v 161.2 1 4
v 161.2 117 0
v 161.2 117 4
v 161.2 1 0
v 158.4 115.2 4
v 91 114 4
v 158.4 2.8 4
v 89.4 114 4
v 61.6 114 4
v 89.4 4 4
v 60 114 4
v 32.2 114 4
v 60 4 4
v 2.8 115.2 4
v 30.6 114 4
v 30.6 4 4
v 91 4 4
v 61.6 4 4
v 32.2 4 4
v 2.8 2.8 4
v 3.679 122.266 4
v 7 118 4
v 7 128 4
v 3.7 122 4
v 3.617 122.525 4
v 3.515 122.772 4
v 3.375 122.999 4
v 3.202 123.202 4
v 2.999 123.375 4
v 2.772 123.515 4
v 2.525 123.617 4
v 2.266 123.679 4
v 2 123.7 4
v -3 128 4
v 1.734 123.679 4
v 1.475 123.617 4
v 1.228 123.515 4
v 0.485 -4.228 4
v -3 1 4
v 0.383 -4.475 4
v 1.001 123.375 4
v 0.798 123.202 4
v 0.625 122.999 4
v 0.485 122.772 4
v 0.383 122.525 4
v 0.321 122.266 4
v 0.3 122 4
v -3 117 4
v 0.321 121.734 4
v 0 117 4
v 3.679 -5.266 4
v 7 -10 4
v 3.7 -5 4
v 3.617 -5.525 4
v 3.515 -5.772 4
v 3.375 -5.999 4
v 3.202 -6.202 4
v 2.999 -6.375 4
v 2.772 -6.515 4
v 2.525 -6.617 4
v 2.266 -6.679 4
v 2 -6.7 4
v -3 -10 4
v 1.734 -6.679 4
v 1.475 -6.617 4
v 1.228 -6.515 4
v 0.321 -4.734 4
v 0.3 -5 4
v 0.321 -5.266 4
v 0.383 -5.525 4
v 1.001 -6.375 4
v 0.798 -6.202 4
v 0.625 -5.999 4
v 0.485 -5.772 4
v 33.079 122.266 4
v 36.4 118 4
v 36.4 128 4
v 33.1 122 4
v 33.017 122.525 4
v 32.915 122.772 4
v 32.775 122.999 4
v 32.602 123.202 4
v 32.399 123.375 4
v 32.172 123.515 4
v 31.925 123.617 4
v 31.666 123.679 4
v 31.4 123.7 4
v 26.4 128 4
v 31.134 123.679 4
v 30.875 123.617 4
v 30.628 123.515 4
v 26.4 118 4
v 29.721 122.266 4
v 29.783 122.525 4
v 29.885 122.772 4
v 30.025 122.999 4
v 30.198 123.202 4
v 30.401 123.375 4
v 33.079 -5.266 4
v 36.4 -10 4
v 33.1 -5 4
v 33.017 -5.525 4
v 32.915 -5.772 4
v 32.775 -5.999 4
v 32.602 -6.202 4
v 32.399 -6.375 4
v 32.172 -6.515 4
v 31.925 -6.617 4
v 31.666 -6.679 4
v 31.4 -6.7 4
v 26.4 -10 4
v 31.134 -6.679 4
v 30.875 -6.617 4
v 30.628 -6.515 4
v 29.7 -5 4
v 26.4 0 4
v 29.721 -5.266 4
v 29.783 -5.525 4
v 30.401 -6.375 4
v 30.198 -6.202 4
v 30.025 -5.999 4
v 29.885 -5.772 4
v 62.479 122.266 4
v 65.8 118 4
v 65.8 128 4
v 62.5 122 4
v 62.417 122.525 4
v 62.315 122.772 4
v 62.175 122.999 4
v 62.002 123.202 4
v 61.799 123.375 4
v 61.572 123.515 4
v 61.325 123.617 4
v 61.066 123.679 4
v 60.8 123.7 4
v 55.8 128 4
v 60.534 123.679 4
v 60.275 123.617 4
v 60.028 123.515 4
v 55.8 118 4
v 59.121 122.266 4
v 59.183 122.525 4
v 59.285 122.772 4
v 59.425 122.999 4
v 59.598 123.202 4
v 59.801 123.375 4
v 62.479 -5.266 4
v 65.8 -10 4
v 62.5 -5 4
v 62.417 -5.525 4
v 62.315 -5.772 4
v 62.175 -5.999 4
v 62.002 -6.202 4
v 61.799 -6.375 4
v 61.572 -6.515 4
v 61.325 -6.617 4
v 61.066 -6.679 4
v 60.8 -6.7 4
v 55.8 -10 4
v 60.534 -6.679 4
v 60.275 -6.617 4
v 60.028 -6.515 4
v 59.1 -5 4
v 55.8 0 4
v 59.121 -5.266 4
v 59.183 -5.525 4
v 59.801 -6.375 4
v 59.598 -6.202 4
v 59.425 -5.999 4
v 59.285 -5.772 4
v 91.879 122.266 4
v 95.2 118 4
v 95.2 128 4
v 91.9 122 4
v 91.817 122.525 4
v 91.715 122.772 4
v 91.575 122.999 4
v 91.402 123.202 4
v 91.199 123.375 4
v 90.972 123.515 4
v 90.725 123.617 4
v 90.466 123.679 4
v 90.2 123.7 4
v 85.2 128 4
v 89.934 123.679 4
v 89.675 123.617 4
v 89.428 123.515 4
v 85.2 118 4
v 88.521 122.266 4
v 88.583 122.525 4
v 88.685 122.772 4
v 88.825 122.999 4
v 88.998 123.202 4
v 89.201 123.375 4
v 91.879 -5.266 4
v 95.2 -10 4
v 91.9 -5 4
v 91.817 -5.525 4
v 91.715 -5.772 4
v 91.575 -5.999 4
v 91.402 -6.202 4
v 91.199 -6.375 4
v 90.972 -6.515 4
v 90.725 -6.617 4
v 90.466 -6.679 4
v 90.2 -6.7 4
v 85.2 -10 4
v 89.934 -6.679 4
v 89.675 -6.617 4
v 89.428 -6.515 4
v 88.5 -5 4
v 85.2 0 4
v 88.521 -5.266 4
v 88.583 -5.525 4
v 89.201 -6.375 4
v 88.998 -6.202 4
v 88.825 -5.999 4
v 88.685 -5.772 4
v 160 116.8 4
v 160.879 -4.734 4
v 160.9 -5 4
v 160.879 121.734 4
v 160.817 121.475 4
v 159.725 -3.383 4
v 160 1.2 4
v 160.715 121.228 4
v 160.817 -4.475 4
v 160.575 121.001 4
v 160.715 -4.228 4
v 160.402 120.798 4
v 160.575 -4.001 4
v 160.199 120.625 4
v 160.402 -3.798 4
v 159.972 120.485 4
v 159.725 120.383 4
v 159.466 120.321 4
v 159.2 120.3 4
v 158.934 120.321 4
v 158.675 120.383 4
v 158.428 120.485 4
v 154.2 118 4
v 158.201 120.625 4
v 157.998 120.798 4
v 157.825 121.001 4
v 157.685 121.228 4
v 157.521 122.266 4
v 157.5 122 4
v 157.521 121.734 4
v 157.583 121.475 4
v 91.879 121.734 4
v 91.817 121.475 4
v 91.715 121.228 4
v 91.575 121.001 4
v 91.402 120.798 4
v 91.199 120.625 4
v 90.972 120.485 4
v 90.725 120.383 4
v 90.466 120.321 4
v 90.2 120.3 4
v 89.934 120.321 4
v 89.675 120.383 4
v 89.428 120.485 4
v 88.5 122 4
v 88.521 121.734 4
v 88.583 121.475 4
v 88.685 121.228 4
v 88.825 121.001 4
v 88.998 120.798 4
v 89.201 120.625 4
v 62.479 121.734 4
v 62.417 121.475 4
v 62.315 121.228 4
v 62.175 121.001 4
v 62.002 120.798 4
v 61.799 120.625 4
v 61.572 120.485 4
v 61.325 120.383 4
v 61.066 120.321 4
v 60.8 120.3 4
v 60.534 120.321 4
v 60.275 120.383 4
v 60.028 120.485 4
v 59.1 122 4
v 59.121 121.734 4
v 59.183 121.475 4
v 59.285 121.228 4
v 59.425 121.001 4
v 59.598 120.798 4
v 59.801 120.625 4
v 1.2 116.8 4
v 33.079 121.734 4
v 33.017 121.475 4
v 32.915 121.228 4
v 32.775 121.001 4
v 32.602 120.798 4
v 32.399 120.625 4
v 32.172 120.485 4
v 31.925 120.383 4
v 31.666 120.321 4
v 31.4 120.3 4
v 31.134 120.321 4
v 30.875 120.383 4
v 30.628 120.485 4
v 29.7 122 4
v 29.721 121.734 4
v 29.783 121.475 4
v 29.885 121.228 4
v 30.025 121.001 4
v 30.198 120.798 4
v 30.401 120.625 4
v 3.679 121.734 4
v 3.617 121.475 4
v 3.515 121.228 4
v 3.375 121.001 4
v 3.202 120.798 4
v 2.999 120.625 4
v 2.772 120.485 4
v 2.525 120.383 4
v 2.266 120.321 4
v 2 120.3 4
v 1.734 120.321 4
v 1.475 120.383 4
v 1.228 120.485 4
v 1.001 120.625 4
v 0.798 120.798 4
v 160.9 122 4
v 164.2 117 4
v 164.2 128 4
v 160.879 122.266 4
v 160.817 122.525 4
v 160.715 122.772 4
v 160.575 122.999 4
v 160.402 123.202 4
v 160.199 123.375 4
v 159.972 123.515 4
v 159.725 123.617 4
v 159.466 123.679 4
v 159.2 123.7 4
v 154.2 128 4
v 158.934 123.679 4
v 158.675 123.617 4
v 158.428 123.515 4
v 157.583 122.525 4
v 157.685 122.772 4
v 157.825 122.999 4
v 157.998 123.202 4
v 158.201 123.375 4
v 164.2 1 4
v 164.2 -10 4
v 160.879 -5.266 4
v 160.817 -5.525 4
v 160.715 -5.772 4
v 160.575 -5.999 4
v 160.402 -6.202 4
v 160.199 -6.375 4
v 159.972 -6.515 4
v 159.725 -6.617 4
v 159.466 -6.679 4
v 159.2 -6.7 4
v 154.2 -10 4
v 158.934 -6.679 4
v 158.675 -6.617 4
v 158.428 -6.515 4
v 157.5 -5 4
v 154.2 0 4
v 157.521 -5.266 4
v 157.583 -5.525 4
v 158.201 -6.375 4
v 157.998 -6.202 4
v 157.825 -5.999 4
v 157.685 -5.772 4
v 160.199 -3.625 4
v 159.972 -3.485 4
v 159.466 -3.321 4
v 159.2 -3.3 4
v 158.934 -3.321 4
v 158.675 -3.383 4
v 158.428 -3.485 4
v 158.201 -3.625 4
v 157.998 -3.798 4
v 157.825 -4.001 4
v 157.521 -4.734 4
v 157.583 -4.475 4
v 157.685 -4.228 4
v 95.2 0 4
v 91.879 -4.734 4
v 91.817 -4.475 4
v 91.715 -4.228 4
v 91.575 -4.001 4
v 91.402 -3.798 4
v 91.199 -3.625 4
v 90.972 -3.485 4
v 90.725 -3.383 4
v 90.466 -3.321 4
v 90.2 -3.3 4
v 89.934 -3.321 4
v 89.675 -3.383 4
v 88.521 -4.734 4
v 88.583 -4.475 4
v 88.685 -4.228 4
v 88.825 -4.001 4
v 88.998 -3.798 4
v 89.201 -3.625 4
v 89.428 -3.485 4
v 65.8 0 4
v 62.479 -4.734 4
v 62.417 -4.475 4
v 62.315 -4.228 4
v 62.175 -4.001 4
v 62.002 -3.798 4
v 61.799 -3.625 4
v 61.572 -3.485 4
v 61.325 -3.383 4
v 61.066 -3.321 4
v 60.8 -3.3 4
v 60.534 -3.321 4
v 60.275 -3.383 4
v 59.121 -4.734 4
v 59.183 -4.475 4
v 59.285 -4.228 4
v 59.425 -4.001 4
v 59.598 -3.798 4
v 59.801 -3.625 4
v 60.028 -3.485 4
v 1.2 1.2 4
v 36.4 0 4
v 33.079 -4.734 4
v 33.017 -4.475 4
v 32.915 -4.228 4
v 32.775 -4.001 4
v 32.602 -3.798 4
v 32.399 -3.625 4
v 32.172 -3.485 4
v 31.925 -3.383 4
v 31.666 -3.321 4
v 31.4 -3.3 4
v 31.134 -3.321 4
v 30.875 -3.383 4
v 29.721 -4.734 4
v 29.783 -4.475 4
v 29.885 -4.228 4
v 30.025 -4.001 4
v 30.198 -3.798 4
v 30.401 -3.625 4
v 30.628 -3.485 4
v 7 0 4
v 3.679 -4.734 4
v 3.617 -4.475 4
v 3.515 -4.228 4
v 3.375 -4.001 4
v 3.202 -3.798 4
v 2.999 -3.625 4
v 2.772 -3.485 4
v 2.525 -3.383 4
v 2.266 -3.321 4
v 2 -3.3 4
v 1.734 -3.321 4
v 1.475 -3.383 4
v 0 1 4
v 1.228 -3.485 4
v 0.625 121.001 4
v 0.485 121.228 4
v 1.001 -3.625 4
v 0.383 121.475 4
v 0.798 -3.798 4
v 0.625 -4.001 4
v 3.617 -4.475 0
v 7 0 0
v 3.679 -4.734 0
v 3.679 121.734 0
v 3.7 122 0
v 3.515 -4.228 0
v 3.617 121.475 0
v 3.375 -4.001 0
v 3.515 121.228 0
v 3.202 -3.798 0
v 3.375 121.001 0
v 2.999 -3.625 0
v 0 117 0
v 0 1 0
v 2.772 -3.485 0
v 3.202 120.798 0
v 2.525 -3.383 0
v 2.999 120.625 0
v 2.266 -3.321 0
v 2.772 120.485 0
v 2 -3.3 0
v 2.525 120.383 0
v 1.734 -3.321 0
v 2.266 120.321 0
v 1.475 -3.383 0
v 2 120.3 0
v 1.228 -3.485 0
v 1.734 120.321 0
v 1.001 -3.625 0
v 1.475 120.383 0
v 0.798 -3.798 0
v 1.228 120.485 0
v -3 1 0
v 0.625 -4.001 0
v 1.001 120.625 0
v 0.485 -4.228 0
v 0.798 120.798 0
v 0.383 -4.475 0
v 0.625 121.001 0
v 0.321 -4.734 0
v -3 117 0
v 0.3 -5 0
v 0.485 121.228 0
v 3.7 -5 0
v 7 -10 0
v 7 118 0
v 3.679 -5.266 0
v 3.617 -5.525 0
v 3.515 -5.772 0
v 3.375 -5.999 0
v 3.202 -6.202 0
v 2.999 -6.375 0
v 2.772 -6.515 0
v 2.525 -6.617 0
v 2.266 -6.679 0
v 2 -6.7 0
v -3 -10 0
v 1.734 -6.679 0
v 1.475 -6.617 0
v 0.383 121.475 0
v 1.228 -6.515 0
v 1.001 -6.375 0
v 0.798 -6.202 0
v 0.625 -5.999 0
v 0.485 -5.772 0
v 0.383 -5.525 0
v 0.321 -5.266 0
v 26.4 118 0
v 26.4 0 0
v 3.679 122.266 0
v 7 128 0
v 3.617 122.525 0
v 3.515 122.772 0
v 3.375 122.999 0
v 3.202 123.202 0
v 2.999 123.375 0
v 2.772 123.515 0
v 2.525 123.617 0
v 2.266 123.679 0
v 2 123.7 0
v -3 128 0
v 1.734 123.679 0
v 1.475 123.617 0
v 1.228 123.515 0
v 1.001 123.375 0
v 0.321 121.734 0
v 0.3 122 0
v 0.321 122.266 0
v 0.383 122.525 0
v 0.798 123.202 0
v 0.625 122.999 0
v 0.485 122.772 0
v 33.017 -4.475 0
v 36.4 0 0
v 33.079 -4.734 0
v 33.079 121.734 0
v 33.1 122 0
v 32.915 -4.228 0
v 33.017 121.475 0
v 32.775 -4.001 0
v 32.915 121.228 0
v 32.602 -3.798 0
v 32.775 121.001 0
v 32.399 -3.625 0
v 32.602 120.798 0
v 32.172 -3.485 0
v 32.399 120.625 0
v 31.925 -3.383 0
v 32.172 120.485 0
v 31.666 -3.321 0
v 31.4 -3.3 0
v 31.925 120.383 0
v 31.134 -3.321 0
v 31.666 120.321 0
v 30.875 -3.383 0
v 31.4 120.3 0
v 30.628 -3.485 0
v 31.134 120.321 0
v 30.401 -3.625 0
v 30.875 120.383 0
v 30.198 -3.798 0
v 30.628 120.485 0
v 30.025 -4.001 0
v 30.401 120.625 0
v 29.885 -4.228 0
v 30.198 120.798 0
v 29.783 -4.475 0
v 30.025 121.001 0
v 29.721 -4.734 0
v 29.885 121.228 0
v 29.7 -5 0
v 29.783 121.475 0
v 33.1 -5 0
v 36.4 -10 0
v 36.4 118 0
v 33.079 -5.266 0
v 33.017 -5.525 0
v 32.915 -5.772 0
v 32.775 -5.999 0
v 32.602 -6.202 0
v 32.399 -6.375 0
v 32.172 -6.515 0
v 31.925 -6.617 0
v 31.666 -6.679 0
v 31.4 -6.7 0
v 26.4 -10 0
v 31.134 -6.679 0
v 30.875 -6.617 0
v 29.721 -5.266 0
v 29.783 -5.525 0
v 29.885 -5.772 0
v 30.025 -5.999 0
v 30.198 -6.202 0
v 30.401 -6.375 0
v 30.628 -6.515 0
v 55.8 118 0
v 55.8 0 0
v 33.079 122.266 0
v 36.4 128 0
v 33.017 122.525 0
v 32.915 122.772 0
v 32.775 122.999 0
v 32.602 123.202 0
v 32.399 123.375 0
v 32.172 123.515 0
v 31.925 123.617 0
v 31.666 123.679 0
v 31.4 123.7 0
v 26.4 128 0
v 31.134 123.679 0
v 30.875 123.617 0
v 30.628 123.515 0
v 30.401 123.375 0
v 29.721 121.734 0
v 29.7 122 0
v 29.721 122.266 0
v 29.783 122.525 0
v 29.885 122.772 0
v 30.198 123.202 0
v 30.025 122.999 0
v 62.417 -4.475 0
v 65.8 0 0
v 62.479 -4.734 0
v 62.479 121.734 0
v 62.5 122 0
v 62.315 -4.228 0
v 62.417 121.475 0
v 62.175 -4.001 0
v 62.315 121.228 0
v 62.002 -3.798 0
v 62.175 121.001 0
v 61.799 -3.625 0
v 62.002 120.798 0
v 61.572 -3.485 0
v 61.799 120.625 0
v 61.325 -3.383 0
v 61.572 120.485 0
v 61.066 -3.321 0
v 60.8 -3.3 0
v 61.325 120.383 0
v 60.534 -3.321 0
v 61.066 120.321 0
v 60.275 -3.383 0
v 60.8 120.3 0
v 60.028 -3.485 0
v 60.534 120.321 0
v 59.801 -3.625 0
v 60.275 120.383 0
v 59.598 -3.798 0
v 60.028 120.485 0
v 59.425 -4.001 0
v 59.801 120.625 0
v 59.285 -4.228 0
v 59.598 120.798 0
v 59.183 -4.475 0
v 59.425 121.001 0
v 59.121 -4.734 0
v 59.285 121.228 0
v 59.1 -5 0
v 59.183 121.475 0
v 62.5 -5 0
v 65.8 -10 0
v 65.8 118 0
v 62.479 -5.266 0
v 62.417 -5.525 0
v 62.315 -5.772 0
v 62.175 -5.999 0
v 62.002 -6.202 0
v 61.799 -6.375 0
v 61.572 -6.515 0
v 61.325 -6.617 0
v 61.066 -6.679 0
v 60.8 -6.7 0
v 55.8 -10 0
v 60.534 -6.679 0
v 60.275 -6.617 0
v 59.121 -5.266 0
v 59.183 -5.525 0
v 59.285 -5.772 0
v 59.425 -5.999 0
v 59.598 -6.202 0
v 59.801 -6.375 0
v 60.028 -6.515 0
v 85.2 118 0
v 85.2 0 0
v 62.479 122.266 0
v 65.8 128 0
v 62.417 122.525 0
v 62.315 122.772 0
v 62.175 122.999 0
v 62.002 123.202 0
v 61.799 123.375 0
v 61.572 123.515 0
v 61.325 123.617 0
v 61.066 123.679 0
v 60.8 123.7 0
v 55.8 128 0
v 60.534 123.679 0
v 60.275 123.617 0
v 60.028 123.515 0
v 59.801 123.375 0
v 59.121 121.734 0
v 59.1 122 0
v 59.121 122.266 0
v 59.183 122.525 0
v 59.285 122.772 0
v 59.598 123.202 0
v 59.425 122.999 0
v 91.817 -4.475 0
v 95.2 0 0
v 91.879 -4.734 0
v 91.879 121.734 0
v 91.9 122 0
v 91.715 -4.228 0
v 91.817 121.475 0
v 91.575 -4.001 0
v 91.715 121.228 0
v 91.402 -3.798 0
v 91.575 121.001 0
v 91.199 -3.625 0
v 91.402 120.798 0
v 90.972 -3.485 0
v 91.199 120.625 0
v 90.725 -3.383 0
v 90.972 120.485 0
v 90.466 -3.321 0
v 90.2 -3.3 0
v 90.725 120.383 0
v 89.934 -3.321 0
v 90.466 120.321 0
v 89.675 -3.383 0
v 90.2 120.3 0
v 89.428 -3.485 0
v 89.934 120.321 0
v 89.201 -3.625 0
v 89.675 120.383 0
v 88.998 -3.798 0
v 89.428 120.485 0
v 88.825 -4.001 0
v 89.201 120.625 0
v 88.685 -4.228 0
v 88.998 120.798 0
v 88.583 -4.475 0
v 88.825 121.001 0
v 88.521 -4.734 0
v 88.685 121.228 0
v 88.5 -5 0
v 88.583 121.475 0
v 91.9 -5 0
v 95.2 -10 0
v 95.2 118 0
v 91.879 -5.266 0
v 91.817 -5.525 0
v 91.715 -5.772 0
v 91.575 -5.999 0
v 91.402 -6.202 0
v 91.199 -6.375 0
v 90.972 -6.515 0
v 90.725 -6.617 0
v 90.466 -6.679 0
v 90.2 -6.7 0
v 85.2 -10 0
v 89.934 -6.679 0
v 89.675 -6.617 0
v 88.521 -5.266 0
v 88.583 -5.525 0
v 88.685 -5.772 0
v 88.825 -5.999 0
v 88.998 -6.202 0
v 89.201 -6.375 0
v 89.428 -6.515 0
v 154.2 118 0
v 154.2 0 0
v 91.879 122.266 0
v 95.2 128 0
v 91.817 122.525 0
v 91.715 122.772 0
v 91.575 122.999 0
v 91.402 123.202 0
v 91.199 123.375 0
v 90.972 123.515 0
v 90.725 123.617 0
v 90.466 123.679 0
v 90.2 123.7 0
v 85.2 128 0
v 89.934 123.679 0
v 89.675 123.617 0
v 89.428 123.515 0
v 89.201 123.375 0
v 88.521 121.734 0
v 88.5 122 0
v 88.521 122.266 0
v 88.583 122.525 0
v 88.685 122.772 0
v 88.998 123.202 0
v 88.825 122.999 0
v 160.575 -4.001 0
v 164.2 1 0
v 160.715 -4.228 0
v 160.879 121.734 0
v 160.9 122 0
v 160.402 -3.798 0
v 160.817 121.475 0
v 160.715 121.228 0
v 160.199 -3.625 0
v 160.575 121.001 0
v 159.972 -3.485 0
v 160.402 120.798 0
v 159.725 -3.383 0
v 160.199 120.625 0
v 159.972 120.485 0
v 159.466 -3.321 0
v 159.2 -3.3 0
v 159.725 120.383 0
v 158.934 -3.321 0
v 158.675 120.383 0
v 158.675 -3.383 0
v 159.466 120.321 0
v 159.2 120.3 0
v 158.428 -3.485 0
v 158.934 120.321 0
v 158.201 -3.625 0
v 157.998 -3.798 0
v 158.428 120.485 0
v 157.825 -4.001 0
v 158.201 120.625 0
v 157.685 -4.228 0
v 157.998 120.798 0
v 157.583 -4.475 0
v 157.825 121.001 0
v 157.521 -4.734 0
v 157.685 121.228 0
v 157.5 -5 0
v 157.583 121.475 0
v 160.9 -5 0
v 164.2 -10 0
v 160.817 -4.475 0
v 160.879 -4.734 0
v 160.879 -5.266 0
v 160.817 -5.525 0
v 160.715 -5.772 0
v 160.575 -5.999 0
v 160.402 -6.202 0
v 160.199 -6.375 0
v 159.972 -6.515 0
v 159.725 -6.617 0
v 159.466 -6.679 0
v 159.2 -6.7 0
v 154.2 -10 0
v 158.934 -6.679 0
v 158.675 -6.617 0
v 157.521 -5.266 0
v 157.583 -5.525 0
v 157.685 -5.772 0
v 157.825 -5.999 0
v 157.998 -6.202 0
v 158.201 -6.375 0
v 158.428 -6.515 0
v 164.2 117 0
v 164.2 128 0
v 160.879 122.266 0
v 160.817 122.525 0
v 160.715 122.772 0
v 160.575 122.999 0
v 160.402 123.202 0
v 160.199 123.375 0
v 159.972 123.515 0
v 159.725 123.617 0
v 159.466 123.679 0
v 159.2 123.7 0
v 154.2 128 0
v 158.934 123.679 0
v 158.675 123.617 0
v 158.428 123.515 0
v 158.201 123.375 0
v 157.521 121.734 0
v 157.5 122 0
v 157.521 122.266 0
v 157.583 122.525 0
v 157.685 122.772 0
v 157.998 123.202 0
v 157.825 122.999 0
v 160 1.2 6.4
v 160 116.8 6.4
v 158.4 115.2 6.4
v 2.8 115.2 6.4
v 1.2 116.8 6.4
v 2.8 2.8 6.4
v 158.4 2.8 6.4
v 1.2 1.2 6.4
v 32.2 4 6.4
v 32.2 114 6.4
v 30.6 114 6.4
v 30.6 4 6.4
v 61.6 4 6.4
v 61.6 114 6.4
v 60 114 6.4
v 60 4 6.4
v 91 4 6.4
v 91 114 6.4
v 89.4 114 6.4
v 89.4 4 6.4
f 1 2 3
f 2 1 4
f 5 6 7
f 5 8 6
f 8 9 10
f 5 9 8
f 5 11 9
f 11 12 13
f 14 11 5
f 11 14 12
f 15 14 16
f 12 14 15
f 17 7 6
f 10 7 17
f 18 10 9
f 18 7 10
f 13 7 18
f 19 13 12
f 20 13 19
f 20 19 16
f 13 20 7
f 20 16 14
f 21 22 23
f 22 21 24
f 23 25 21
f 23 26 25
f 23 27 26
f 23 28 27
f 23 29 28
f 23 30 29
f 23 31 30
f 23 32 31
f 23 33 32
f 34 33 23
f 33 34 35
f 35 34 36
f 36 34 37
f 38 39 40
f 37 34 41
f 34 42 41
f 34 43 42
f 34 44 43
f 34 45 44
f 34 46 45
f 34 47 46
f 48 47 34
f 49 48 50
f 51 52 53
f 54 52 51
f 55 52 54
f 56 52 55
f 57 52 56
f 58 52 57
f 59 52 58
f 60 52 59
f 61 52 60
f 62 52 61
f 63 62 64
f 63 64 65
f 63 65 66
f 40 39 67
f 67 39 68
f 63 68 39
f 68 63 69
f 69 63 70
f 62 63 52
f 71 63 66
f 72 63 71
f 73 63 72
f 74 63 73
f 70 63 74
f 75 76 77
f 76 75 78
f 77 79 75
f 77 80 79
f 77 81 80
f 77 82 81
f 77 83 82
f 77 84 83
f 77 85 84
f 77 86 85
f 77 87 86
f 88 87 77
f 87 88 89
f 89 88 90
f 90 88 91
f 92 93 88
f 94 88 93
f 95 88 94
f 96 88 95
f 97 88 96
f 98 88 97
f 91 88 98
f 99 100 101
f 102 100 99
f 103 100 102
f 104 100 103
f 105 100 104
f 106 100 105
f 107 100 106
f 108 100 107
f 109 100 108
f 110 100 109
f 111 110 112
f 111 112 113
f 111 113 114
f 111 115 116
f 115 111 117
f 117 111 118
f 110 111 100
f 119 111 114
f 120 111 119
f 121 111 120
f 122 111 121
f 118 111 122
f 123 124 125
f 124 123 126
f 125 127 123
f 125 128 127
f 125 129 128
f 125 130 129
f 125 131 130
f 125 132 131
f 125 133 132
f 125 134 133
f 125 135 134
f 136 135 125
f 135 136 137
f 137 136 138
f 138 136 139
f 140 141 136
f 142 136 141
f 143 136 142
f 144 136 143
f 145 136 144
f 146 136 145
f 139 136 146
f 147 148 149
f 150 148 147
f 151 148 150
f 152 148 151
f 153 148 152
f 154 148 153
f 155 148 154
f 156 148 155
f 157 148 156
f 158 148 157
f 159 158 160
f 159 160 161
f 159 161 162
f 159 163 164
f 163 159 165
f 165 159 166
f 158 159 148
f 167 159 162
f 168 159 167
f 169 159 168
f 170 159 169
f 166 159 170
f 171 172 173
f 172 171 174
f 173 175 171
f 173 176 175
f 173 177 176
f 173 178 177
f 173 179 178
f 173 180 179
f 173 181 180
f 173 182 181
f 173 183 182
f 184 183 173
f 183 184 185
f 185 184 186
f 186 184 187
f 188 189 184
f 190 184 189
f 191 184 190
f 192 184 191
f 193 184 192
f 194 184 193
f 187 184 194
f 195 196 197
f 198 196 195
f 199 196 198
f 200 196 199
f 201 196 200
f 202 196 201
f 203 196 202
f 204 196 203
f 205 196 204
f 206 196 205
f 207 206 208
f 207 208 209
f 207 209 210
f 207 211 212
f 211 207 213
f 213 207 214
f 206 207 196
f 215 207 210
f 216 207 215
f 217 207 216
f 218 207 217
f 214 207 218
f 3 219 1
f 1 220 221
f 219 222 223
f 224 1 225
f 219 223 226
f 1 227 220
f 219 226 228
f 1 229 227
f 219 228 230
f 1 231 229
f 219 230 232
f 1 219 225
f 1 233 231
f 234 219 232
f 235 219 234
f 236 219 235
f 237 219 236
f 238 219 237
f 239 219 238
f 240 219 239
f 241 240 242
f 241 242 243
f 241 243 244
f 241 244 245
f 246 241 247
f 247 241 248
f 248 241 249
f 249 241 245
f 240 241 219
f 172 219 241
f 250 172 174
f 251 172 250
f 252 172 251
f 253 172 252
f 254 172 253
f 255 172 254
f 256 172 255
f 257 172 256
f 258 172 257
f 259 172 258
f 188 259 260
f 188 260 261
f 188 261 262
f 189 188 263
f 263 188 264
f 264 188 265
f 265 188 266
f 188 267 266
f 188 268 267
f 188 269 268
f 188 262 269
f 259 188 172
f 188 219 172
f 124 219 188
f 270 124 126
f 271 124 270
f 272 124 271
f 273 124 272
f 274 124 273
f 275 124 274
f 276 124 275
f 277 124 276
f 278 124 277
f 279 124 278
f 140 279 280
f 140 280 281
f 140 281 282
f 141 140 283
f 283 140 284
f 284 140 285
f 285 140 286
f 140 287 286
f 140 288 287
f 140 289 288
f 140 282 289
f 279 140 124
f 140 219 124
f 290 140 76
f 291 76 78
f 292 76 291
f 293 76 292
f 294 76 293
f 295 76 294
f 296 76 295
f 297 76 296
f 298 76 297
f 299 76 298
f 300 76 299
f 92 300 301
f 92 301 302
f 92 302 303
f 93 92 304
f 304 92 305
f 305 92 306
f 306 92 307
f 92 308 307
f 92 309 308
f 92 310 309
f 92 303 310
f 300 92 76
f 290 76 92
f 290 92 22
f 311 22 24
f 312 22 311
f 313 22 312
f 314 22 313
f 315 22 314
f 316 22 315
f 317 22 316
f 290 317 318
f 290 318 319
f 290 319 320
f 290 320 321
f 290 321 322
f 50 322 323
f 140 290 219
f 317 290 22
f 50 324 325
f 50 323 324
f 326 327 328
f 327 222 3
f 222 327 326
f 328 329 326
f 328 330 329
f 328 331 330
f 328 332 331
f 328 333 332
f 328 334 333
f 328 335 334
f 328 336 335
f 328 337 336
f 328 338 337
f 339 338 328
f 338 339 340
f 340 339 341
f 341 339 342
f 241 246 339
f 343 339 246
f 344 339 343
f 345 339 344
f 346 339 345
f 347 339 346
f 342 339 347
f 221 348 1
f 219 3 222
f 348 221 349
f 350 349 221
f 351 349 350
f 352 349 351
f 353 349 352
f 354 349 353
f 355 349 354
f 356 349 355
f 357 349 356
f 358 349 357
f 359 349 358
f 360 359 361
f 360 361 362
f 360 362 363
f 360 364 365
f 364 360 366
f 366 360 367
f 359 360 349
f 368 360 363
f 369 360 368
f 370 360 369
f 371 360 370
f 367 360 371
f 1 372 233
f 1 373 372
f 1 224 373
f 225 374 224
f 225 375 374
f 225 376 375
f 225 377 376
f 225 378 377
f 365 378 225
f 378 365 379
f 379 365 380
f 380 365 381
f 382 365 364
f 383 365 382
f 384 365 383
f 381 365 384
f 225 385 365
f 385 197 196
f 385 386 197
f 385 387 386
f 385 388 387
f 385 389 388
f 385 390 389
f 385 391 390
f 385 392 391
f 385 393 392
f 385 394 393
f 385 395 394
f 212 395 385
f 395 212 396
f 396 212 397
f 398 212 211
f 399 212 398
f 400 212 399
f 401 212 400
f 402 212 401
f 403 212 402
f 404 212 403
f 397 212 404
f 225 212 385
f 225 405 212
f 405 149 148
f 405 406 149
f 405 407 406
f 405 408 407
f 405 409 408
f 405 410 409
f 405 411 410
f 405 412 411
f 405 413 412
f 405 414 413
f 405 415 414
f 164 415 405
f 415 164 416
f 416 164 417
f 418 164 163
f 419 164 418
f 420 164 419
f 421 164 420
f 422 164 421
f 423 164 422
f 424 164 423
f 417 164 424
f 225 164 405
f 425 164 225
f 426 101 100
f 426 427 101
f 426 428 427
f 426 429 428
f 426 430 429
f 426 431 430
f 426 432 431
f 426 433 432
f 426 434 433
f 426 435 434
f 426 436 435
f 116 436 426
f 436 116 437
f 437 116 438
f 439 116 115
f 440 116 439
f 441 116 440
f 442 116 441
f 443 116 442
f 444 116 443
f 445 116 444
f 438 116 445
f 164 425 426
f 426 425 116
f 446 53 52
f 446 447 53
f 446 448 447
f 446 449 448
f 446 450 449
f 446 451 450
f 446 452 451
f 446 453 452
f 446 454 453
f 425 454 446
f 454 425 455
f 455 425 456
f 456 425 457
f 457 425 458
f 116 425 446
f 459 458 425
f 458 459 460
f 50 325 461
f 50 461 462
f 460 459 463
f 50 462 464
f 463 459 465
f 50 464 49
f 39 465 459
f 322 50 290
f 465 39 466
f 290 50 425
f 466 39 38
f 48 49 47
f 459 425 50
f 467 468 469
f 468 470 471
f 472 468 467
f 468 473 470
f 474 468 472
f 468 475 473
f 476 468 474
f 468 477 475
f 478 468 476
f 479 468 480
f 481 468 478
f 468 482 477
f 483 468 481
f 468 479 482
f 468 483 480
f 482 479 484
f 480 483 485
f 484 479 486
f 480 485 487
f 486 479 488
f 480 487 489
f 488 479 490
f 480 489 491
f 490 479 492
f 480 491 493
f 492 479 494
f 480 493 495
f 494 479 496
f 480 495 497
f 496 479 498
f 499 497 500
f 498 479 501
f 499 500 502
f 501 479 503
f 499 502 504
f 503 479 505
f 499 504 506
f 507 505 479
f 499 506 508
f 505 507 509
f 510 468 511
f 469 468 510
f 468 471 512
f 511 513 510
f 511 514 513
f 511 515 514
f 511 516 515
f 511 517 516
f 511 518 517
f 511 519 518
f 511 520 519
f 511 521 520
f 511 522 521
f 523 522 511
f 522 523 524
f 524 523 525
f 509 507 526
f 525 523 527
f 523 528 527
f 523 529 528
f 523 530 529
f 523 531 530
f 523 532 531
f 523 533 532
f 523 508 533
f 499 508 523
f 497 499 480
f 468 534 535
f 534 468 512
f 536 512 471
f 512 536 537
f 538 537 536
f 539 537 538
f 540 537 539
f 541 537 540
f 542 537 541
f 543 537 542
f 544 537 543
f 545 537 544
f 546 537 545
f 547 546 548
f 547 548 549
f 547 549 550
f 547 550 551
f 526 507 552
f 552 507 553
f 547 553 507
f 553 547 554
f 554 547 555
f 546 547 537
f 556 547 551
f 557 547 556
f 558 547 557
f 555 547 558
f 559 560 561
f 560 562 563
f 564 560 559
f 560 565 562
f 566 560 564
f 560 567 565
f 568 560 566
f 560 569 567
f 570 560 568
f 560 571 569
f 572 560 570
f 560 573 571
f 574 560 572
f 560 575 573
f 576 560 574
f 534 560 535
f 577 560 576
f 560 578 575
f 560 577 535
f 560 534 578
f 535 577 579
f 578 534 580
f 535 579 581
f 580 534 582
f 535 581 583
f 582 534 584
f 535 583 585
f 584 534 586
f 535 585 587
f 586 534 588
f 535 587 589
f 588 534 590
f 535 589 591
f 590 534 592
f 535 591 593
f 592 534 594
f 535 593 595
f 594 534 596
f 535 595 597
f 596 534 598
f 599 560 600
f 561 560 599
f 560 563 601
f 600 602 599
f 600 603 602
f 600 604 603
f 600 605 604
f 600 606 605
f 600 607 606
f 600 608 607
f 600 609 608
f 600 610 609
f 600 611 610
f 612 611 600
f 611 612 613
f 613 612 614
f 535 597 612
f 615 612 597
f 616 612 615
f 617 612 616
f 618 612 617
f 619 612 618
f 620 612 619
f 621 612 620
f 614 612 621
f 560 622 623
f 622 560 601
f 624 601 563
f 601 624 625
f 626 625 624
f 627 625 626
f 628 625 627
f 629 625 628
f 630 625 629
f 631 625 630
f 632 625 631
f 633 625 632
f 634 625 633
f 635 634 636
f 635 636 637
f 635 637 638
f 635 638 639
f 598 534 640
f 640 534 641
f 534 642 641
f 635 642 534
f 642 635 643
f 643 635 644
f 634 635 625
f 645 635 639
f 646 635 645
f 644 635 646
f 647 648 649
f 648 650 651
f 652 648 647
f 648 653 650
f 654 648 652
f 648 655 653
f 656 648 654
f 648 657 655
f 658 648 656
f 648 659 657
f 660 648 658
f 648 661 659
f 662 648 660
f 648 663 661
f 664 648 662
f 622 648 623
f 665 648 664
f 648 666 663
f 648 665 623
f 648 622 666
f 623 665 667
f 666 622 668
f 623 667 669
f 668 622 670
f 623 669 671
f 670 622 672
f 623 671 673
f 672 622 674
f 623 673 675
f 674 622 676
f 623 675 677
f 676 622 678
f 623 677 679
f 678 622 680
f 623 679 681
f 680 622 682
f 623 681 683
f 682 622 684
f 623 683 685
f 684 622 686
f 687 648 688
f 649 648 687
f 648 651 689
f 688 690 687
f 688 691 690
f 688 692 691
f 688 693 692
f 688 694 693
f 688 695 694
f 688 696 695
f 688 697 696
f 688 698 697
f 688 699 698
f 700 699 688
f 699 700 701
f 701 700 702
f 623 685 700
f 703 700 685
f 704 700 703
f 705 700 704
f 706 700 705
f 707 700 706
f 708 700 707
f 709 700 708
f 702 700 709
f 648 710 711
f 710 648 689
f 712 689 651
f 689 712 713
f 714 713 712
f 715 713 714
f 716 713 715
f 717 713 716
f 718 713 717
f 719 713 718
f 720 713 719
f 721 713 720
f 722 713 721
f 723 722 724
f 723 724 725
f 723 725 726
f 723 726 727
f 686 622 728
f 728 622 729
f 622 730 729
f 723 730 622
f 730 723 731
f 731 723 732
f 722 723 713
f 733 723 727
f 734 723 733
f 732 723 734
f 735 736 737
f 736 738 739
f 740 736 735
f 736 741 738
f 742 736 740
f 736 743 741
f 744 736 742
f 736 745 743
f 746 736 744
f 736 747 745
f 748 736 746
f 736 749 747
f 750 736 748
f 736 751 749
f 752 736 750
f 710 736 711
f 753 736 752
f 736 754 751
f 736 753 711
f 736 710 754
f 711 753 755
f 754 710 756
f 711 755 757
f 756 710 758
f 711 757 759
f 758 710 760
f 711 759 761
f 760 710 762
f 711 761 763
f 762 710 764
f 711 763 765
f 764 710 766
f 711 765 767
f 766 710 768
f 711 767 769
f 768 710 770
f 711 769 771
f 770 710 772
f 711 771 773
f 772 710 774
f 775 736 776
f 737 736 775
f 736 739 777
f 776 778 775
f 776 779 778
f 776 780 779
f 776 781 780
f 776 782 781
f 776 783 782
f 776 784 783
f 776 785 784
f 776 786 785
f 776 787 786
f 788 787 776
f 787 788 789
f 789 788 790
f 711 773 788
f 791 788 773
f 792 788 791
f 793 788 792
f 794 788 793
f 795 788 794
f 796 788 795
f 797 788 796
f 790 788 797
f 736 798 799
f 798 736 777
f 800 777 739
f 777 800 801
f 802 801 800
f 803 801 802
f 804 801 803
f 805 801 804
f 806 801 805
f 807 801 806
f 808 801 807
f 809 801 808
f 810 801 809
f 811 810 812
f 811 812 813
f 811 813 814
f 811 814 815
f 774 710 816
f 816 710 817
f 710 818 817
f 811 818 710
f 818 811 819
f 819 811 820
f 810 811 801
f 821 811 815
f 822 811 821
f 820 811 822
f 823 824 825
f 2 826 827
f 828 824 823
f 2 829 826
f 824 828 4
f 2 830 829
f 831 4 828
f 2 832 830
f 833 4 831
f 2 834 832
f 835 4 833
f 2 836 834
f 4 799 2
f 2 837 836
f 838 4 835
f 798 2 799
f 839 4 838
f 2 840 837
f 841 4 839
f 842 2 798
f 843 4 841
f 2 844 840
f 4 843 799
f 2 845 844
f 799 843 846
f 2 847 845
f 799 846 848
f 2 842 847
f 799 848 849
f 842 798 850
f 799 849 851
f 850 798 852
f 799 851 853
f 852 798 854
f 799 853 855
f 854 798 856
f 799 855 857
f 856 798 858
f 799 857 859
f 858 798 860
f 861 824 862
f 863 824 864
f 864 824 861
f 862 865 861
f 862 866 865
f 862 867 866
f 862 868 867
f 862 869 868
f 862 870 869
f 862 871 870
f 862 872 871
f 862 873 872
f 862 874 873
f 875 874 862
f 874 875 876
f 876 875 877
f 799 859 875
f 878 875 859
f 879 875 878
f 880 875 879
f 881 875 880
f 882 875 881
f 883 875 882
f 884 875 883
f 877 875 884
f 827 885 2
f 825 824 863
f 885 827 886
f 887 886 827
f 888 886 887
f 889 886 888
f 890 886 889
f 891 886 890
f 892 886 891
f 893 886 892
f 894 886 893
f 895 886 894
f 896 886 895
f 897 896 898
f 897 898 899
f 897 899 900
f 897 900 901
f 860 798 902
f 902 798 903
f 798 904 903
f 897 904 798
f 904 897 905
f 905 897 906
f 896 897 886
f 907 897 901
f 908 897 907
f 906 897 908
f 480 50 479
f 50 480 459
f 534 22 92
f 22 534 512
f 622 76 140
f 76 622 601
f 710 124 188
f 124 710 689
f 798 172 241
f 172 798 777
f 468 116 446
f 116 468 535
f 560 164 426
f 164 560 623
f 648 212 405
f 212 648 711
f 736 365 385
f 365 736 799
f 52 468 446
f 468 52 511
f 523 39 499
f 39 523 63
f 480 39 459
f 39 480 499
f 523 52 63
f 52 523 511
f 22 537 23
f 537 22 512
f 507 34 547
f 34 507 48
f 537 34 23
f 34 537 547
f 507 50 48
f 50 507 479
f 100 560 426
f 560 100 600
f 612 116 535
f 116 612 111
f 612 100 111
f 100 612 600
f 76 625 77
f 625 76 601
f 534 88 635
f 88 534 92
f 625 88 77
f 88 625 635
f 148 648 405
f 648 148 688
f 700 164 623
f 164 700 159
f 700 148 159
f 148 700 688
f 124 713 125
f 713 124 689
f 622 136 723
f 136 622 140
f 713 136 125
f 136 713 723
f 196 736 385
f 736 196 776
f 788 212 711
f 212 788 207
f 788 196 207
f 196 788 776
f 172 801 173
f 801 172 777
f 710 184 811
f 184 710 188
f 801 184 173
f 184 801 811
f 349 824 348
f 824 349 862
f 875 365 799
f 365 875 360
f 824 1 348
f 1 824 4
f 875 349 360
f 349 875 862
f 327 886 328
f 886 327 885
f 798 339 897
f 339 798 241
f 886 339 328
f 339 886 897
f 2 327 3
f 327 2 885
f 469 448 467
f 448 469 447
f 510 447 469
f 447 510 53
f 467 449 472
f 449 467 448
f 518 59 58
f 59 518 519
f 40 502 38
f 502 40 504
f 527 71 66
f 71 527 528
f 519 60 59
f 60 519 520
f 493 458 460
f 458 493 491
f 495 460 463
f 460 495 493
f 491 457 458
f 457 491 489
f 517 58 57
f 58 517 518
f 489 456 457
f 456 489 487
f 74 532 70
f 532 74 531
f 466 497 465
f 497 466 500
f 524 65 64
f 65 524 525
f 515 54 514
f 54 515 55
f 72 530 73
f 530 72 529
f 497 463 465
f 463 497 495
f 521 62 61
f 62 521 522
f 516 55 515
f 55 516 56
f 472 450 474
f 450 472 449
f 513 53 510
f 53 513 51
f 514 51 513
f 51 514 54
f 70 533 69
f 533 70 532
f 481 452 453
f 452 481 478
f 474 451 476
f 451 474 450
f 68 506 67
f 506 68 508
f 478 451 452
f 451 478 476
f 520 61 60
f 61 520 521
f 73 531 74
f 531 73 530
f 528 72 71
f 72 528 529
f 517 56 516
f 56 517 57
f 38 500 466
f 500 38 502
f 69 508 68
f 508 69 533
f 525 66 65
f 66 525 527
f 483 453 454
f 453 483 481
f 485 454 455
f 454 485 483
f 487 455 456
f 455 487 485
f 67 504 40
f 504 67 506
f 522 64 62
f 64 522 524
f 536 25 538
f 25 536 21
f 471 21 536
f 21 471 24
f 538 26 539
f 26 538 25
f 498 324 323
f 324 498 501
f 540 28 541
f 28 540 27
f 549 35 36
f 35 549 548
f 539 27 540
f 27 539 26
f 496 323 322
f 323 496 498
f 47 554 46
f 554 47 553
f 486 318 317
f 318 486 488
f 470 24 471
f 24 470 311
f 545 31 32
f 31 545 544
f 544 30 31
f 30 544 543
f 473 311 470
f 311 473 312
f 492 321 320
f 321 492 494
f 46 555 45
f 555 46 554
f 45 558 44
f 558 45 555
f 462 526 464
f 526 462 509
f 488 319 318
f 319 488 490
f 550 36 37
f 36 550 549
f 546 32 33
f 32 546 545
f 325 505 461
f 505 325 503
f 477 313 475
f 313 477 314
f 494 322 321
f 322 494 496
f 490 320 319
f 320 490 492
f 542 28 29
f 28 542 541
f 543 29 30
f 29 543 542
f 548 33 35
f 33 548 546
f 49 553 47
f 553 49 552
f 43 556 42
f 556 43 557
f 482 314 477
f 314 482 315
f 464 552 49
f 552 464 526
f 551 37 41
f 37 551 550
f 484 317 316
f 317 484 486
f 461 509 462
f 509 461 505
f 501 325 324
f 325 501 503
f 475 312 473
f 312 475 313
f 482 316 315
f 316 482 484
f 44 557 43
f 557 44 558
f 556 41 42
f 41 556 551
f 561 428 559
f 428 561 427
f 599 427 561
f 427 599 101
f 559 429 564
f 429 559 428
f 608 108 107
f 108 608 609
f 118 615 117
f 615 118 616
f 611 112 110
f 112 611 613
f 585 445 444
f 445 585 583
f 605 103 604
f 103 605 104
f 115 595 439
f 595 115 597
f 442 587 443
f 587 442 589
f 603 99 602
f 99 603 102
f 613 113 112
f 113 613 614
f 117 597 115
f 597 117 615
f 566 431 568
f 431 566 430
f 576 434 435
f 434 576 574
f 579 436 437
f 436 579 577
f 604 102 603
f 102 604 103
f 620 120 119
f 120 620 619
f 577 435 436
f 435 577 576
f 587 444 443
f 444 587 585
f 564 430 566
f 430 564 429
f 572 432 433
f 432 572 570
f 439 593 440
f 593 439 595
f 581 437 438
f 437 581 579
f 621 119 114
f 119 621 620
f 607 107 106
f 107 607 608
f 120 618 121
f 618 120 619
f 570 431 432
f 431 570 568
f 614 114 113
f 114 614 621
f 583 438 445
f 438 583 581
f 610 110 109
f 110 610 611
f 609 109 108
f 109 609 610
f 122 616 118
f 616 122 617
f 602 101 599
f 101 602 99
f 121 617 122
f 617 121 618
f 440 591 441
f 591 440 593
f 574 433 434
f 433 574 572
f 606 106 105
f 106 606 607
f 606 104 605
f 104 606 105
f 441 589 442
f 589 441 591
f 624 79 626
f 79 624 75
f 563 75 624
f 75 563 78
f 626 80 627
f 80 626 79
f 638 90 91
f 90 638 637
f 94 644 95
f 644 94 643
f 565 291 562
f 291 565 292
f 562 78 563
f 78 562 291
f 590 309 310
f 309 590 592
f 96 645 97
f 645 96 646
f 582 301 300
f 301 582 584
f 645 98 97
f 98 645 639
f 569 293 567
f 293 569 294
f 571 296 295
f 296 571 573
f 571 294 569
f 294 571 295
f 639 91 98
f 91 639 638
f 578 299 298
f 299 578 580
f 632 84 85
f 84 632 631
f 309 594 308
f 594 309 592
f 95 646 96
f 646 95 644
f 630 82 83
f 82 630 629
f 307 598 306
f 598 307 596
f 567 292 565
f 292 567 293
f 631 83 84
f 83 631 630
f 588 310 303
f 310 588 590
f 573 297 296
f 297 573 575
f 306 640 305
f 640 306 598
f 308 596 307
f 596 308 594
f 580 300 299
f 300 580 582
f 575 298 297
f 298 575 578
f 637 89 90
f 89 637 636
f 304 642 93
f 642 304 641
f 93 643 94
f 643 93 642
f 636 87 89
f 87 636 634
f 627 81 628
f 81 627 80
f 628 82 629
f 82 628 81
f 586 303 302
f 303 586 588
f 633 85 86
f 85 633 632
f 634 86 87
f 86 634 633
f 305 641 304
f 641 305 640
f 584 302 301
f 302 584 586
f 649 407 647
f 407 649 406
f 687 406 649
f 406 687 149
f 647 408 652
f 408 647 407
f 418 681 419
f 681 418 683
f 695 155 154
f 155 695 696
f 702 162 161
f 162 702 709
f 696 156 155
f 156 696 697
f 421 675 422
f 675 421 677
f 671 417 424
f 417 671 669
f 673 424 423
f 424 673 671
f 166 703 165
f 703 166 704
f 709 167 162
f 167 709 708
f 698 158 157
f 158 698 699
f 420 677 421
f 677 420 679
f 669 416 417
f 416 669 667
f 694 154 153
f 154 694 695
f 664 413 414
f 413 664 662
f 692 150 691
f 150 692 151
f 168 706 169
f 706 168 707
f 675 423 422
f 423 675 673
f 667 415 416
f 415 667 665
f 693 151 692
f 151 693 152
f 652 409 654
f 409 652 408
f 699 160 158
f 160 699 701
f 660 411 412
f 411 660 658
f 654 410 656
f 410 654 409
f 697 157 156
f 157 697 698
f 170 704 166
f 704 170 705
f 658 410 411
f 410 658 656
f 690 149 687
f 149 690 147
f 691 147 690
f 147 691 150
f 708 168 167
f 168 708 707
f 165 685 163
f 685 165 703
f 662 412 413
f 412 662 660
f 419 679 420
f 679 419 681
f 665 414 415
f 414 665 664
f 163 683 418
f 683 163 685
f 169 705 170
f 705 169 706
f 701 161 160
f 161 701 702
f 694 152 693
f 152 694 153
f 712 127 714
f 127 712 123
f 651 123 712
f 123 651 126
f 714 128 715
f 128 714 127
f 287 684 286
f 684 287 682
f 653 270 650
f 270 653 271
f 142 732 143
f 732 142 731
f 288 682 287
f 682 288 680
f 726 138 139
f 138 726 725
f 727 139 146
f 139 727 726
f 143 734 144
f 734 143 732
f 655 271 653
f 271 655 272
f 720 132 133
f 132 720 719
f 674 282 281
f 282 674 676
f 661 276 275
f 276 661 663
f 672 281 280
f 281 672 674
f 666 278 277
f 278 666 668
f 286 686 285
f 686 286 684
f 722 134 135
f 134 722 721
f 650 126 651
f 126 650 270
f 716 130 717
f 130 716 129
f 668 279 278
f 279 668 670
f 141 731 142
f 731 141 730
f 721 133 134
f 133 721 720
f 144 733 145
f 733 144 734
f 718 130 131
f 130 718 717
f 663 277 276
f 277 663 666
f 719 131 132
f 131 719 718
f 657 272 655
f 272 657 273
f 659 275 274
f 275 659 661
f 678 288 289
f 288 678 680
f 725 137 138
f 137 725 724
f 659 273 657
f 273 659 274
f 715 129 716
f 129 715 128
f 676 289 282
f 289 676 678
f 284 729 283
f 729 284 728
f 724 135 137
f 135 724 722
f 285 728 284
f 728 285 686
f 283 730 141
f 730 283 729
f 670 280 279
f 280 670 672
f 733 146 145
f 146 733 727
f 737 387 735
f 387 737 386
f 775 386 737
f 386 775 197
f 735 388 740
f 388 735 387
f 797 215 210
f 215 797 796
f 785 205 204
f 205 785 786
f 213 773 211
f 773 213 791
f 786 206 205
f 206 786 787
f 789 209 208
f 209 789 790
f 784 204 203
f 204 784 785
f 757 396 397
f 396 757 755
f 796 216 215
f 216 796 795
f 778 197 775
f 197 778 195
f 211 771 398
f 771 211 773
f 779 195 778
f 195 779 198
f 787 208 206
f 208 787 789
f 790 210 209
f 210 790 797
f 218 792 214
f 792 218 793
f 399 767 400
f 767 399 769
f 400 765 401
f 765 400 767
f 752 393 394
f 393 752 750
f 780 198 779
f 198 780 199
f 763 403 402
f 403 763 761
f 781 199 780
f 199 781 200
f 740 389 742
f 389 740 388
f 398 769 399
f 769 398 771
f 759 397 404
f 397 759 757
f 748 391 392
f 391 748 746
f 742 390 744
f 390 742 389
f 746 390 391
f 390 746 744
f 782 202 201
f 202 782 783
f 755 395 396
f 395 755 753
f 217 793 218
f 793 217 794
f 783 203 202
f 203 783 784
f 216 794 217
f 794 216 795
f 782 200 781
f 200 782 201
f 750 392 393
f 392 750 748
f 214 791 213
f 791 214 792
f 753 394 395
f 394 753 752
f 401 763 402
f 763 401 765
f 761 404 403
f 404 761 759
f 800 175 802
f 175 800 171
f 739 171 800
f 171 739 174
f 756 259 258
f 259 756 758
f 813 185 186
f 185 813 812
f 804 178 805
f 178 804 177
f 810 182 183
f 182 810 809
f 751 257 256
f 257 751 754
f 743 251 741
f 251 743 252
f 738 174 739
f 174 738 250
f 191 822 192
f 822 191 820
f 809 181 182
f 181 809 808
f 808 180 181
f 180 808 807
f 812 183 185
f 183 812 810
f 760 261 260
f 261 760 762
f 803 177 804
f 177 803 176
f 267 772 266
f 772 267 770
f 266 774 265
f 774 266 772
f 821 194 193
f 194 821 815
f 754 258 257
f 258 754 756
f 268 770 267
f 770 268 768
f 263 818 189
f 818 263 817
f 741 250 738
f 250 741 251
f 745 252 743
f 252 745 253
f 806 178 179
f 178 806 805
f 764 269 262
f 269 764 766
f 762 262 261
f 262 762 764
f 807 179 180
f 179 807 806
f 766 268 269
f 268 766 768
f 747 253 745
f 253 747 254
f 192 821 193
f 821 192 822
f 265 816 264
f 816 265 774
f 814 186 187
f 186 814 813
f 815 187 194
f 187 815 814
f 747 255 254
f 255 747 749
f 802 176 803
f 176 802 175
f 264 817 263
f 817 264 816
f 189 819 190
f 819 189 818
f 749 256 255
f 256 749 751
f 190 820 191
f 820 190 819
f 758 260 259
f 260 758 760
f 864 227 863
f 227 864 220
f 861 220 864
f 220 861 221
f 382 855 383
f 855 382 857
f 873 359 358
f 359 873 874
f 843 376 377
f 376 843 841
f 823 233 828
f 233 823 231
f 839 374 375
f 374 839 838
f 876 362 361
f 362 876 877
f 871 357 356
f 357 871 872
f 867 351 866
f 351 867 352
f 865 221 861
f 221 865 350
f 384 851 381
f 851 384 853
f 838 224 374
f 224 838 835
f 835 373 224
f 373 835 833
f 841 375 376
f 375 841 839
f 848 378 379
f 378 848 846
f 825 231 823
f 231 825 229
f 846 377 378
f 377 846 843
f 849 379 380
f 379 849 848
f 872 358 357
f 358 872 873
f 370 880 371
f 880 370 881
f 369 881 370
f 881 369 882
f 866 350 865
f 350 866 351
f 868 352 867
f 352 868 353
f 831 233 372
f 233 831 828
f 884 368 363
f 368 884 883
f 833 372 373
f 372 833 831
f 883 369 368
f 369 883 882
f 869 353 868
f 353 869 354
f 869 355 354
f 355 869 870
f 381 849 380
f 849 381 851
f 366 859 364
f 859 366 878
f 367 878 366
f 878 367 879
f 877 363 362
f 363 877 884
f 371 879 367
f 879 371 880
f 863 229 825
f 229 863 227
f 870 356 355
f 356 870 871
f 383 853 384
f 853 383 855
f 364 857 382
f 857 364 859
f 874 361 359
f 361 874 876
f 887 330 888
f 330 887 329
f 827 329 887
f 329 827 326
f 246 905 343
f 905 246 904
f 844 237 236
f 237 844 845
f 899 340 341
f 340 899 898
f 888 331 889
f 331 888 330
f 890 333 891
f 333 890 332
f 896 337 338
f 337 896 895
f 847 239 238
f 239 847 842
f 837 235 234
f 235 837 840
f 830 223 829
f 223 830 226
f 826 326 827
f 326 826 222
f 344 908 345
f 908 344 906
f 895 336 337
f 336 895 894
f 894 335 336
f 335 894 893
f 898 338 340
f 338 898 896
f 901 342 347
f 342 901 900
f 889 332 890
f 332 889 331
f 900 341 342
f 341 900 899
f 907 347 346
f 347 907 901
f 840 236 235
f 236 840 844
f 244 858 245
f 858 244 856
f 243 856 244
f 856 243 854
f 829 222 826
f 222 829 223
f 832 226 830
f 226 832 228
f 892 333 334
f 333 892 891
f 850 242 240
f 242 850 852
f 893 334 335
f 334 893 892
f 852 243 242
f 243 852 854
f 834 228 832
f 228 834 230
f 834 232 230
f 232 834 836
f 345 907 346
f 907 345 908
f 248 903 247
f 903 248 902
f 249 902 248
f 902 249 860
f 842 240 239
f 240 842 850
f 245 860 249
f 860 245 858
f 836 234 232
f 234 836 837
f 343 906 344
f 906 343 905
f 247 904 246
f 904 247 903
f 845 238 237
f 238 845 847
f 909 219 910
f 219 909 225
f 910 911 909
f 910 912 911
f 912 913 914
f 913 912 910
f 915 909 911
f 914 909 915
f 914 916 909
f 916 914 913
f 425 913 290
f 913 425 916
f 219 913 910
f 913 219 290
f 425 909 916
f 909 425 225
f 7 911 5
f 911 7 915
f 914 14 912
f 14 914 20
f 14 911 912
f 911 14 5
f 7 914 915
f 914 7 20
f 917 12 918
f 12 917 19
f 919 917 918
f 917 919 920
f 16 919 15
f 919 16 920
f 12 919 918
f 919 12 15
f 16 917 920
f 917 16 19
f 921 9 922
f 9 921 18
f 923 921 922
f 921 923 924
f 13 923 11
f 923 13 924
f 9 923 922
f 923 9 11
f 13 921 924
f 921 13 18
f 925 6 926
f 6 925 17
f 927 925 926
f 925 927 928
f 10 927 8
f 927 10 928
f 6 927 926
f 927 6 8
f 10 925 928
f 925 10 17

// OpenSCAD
// Auto-generated Marine Vault LID V2 - External Fastener Tabs
$fn = 40;

module screw_tabs_lid() {
    // Main flat lid plate
    cube([161.2, 118.0, 4.0]);
    
    // Matching ears for the lid clearance bolts
        translate([-3.0, -10.0, 0]) cube([10.0, 10.0 + 1, 4.0]);
    translate([-3.0, 118.0 - 1, 0]) cube([10.0, 10.0 + 1, 4.0]);
    translate([26.4, -10.0, 0]) cube([10.0, 10.0 + 1, 4.0]);
    translate([26.4, 118.0 - 1, 0]) cube([10.0, 10.0 + 1, 4.0]);
    translate([55.8, -10.0, 0]) cube([10.0, 10.0 + 1, 4.0]);
    translate([55.8, 118.0 - 1, 0]) cube([10.0, 10.0 + 1, 4.0]);
    translate([85.19999999999999, -10.0, 0]) cube([10.0, 10.0 + 1, 4.0]);
    translate([85.19999999999999, 118.0 - 1, 0]) cube([10.0, 10.0 + 1, 4.0]);
    translate([154.2, -10.0, 0]) cube([10.0, 10.0 + 1, 4.0]);
    translate([154.2, 118.0 - 1, 0]) cube([10.0, 10.0 + 1, 4.0]);

}

module marine_vault_lid() {
    difference() {
        screw_tabs_lid();
        
        // Clearance Bolt Holes shifted outside the gasket boundary
                translate([2.0, -5.0, -1]) cylinder(r=1.7, h=6.0);
        translate([2.0, 118.0 + 4.0, -1]) cylinder(r=1.7, h=6.0);
        translate([31.4, -5.0, -1]) cylinder(r=1.7, h=6.0);
        translate([31.4, 118.0 + 4.0, -1]) cylinder(r=1.7, h=6.0);
        translate([60.8, -5.0, -1]) cylinder(r=1.7, h=6.0);
        translate([60.8, 118.0 + 4.0, -1]) cylinder(r=1.7, h=6.0);
        translate([90.19999999999999, -5.0, -1]) cylinder(r=1.7, h=6.0);
        translate([90.19999999999999, 118.0 + 4.0, -1]) cylinder(r=1.7, h=6.0);
        translate([159.2, -5.0, -1]) cylinder(r=1.7, h=6.0);
        translate([159.2, 118.0 + 4.0, -1]) cylinder(r=1.7, h=6.0);

    }
    
    // Inverted Knife-Edge Gasket Press Rails - Uninterrupted continuous grid
    translate([0, 0, 4.0]) {
                // Continuous Outer Knife-Edge Loop
        difference() {
            translate([1.2, 1.2, 0]) cube([158.79999999999998, 115.6, 2.4]);
            translate([2.8, 2.8, -1]) cube([155.6, 112.39999999999999, 2.4 + 2]);
        }
        translate([30.599999999999998, 4.0, 0]) cube([1.6, 110.0, 2.4]);
        translate([60.0, 4.0, 0]) cube([1.6, 110.0, 2.4]);
        translate([89.39999999999999, 4.0, 0]) cube([1.6, 110.0, 2.4]);

    }
}
marine_vault_lid();
